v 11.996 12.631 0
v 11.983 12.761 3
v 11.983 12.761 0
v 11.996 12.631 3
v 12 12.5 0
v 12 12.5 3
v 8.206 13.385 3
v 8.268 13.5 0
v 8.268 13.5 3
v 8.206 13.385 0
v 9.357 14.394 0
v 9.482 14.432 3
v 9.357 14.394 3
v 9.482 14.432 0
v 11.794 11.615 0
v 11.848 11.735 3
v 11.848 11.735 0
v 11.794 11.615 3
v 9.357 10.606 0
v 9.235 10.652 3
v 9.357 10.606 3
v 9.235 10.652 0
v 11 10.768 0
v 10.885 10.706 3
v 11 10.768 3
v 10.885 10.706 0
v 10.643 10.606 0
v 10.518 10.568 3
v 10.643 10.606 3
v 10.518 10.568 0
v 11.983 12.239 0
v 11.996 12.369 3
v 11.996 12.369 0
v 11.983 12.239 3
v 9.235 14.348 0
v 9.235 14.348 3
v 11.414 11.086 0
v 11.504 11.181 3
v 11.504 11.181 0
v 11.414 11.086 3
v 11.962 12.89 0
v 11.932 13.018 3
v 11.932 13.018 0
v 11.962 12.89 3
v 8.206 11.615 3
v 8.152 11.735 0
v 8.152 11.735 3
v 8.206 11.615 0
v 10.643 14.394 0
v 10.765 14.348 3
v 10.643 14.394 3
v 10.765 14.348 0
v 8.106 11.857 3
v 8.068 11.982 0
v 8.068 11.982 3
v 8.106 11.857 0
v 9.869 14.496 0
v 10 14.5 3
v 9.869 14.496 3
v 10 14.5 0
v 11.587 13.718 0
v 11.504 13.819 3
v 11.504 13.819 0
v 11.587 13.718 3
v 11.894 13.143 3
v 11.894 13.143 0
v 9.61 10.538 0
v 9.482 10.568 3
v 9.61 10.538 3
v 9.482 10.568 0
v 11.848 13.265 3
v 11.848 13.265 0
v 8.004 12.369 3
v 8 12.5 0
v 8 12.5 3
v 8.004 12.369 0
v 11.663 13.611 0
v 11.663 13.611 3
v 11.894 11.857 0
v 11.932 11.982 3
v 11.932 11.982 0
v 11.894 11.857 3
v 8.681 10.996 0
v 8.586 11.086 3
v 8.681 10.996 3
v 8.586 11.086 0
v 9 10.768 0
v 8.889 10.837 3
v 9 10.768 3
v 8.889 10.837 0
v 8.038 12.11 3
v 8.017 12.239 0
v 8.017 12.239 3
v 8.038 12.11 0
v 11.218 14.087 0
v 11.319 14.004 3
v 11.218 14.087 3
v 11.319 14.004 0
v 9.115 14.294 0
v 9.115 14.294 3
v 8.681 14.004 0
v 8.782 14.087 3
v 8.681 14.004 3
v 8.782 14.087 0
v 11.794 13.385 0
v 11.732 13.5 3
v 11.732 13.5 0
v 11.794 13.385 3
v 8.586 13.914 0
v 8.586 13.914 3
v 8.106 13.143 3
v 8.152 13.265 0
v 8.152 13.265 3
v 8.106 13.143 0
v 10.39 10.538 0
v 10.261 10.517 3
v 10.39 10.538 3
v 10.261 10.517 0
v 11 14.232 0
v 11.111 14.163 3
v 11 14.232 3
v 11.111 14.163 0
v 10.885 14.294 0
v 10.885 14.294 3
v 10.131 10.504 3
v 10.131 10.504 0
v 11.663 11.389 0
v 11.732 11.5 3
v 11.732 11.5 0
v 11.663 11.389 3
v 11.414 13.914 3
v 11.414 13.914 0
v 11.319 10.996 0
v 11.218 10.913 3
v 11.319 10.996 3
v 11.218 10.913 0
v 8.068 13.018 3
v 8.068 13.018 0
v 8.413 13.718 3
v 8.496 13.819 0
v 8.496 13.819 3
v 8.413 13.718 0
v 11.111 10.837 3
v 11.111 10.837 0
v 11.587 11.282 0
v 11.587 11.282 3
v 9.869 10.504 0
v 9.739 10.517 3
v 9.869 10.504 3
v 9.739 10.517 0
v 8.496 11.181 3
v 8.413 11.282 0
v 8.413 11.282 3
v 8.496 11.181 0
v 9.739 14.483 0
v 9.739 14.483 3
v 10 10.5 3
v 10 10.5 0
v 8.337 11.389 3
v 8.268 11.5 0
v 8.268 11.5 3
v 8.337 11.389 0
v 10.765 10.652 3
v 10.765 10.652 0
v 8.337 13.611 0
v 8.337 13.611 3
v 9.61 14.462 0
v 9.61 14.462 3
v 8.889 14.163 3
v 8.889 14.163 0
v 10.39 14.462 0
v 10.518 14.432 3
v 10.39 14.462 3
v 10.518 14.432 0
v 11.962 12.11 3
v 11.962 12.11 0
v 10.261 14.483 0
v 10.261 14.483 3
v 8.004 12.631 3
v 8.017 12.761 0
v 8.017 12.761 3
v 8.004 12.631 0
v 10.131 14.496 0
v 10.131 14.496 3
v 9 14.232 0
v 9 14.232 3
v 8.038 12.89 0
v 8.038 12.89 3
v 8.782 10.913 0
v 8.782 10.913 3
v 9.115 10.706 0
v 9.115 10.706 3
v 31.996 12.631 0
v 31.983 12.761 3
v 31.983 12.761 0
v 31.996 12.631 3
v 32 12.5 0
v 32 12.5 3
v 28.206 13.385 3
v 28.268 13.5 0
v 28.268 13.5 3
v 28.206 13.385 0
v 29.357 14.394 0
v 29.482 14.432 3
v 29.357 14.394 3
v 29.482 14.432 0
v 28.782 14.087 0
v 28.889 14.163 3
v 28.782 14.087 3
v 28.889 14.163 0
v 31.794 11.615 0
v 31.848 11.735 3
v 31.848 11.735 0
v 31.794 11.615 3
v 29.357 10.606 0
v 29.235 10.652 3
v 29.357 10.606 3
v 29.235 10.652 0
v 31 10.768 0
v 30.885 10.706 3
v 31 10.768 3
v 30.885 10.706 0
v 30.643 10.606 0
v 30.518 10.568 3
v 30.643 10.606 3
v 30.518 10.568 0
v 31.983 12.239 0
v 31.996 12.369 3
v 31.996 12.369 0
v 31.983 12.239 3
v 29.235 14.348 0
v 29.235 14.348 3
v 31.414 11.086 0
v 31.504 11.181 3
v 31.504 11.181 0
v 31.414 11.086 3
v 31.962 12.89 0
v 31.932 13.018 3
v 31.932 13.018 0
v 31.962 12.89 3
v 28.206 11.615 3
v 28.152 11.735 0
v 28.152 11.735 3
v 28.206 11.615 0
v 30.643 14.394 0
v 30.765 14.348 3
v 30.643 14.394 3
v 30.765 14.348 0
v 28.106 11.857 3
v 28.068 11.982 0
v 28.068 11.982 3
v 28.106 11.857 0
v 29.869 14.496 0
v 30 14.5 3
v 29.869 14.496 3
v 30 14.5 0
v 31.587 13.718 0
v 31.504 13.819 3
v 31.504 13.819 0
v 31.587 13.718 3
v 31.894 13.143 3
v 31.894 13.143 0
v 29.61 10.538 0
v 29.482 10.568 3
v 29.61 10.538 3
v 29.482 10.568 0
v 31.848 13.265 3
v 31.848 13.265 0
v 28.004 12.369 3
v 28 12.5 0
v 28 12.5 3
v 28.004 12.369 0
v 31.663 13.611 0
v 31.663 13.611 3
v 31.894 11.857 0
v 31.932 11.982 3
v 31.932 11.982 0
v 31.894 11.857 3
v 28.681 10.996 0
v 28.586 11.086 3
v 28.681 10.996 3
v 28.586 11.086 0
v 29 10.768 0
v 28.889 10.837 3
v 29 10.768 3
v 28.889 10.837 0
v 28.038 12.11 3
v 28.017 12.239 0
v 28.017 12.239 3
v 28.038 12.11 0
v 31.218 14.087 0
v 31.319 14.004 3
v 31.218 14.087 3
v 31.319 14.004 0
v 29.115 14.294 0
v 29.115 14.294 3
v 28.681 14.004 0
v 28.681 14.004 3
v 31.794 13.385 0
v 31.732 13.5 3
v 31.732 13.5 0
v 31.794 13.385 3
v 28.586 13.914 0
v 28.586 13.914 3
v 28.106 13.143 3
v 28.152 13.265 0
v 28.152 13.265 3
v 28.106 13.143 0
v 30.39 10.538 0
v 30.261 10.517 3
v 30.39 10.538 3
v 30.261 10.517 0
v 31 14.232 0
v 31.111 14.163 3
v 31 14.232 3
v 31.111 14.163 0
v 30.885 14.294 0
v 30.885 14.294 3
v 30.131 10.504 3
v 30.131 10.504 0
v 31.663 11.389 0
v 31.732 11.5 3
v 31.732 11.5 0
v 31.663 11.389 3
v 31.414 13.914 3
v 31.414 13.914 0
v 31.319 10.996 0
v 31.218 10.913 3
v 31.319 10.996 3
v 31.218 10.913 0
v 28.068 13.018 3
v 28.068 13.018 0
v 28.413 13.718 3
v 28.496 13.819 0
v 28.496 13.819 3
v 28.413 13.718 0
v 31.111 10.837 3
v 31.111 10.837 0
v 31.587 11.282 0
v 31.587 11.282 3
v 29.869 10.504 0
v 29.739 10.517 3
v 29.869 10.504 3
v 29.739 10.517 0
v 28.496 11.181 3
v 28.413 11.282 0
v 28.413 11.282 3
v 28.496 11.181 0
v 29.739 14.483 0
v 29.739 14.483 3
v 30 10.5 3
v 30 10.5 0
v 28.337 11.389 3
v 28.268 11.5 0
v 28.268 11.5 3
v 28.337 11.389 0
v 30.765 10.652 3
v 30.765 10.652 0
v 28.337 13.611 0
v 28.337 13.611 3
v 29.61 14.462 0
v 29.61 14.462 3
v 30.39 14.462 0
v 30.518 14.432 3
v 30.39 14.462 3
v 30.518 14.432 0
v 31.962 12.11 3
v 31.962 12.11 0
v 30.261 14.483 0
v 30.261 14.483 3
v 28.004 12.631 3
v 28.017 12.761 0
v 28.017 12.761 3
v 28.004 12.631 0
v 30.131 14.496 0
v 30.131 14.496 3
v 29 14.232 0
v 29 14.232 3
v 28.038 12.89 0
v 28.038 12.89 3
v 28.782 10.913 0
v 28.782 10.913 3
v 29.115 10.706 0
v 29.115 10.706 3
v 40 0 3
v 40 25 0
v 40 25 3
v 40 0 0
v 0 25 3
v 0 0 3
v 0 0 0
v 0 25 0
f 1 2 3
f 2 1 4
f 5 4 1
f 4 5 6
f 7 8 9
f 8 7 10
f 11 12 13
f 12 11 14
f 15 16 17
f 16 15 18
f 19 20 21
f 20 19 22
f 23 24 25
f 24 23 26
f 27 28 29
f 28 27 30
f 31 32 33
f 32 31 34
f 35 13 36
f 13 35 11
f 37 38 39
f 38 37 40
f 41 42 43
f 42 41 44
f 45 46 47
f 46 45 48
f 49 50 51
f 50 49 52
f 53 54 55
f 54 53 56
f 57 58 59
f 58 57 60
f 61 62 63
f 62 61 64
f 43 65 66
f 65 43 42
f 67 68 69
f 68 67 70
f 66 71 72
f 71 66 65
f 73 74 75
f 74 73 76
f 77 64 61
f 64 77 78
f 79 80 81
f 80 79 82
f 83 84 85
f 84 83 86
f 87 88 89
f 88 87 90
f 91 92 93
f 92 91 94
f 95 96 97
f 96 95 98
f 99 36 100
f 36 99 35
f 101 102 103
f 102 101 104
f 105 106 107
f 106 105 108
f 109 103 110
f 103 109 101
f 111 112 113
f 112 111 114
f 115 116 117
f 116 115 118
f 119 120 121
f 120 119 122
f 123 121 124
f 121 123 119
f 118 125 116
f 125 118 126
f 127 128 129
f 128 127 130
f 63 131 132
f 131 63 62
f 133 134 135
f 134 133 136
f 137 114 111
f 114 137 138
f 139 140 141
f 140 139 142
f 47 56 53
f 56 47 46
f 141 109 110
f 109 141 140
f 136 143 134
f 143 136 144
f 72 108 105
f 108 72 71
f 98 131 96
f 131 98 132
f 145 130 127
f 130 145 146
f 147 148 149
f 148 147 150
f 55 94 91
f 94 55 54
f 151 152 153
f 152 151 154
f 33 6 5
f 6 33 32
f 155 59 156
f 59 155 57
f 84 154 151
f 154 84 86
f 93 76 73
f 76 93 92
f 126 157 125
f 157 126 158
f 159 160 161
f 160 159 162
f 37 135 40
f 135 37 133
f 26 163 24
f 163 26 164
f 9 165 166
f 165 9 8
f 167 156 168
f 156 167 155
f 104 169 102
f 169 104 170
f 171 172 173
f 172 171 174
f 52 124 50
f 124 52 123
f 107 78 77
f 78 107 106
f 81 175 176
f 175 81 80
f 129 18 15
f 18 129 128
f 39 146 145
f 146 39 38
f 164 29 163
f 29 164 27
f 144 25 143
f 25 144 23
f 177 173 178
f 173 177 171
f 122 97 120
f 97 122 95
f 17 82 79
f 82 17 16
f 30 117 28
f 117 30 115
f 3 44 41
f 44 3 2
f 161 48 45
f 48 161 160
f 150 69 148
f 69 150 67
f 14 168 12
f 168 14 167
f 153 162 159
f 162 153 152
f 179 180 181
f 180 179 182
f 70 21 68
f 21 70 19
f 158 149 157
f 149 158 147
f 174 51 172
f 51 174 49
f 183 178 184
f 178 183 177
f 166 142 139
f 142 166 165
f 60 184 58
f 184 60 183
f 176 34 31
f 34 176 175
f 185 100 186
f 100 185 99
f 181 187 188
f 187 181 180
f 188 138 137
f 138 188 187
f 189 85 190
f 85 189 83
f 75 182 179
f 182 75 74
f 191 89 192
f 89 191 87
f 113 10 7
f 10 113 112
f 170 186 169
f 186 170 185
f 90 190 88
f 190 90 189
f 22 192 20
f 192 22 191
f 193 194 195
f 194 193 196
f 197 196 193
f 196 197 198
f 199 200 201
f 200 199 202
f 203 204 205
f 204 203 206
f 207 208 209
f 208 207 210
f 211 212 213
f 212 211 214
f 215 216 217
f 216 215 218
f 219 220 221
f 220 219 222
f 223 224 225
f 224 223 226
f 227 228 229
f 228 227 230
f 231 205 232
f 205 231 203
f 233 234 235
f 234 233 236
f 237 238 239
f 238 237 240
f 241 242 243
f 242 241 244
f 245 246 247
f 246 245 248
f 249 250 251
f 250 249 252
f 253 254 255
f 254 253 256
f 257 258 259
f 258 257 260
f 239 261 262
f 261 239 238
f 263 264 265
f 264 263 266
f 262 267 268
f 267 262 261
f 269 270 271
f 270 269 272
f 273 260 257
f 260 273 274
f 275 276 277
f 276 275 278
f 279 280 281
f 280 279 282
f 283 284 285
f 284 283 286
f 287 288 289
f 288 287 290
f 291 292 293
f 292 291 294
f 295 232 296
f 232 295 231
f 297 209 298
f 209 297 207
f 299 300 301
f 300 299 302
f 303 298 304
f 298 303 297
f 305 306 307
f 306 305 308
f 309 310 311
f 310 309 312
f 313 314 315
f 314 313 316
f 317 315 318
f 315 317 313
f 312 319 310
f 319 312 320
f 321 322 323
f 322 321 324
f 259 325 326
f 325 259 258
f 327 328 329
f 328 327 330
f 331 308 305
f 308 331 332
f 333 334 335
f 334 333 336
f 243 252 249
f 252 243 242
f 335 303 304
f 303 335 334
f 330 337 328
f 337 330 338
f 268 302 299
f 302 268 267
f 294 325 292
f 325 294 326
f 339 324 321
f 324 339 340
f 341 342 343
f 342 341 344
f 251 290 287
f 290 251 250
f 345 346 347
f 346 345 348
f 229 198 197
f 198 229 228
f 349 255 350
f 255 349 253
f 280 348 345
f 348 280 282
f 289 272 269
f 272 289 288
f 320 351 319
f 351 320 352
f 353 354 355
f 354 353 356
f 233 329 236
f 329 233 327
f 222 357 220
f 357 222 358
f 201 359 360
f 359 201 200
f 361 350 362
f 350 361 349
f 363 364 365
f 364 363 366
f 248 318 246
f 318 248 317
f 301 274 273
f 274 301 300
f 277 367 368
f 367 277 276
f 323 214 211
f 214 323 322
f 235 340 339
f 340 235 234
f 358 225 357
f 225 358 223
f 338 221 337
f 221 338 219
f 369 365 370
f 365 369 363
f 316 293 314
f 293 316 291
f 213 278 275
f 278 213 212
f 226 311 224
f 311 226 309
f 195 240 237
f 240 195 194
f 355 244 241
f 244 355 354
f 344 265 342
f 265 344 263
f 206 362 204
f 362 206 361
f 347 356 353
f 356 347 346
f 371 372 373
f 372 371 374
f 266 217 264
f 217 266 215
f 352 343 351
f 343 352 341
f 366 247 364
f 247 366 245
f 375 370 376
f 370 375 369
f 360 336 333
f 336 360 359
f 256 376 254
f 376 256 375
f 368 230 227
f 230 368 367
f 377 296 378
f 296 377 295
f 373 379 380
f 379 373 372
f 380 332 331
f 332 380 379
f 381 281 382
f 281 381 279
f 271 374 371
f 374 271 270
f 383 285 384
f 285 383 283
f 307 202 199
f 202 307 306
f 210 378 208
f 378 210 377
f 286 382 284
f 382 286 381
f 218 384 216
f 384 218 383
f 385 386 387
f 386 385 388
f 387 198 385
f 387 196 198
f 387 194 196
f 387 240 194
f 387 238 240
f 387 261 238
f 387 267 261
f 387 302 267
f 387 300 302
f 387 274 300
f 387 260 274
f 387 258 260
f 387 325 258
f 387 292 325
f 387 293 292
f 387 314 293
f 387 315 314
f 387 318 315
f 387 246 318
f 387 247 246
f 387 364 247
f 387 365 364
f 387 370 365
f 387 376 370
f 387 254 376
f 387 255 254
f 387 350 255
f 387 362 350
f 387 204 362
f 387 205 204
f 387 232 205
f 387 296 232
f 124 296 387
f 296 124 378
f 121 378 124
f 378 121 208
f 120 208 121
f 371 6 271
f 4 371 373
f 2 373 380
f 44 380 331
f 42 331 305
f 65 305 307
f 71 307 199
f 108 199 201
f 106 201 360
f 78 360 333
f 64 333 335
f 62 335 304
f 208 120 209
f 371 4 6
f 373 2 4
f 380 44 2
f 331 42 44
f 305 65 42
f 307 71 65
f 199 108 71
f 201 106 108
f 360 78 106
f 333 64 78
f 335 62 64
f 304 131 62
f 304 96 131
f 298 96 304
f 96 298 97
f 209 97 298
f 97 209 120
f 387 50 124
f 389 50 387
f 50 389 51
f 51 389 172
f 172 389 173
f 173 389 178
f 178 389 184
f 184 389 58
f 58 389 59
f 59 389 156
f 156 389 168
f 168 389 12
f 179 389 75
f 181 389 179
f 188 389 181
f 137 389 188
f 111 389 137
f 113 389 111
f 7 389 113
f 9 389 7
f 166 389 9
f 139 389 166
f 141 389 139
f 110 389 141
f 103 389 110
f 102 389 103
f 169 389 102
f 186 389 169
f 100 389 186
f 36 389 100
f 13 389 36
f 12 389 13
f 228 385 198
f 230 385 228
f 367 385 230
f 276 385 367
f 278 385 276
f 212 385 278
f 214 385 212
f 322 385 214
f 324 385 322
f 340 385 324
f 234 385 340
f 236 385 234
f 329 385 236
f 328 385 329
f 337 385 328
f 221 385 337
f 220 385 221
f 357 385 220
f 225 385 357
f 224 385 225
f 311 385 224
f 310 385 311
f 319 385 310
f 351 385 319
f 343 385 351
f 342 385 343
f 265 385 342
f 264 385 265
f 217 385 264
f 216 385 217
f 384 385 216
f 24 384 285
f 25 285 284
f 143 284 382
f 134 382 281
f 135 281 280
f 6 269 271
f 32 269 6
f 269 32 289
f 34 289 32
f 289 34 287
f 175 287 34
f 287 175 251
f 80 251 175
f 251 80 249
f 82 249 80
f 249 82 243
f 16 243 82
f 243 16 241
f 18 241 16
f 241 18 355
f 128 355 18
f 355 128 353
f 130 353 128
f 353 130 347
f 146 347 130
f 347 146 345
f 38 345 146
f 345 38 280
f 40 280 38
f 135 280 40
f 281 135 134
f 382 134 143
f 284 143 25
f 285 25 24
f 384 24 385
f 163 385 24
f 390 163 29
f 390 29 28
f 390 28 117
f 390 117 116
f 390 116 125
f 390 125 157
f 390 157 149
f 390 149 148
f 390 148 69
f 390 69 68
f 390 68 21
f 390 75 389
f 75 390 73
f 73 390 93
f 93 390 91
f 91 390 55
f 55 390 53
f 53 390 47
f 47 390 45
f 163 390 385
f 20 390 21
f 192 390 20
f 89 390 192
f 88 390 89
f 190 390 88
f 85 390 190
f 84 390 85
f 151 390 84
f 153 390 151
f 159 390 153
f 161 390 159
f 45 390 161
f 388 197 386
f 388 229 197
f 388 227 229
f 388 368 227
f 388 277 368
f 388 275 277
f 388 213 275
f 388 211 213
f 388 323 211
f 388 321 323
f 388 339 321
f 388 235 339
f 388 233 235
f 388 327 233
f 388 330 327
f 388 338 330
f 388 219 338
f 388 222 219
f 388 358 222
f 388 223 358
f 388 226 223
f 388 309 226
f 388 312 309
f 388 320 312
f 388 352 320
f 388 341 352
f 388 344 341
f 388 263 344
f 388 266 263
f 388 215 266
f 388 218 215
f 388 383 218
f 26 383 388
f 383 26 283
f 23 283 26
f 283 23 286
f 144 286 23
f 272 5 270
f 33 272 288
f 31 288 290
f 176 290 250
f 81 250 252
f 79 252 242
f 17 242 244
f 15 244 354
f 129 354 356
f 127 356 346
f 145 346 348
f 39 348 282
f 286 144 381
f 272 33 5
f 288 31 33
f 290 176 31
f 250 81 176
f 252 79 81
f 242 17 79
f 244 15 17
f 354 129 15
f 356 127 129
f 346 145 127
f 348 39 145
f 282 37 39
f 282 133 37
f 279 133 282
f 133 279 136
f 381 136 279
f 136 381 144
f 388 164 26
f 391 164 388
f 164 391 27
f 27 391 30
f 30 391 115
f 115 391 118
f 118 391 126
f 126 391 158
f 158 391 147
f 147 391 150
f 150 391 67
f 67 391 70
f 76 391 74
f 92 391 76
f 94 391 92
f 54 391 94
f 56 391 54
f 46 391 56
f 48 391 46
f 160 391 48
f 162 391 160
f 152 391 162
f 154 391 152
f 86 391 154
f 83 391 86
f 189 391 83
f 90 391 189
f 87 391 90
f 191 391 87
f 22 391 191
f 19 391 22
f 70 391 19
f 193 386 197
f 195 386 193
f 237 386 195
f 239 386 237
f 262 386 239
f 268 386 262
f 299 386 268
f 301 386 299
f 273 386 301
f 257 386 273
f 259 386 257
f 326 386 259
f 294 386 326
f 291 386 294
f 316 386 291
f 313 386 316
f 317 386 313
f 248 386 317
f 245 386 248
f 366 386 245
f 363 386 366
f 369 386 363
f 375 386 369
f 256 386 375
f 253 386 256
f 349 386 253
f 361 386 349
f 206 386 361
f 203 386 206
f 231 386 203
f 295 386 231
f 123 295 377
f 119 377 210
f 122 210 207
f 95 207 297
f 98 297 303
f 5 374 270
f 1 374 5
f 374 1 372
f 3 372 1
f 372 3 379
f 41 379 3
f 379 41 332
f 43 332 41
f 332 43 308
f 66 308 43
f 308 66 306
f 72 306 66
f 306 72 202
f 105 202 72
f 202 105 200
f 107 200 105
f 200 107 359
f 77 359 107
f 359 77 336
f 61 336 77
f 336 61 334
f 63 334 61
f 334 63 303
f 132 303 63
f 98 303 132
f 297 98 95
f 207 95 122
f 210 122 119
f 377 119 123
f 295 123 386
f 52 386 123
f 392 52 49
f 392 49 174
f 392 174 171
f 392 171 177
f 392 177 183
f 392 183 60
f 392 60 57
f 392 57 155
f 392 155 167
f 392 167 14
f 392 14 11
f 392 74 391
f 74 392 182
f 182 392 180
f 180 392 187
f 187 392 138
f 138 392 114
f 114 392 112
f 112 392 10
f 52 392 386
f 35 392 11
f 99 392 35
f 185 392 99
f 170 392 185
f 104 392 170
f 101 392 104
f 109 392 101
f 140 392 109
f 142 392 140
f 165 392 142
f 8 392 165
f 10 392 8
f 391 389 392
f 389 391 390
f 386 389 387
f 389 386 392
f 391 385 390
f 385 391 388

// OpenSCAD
// Parametric plate: millimeters, watertight constructive solid geometry.
width = 40;
depth = 25;
height = 3;
hole_diameter = 4;
$fn = 96;
difference() {
    cube([width, depth, height]);
    for (x = [10, 30])
        translate([x, 12.5, -1]) cylinder(h=height+2, d=hole_diameter);
}
